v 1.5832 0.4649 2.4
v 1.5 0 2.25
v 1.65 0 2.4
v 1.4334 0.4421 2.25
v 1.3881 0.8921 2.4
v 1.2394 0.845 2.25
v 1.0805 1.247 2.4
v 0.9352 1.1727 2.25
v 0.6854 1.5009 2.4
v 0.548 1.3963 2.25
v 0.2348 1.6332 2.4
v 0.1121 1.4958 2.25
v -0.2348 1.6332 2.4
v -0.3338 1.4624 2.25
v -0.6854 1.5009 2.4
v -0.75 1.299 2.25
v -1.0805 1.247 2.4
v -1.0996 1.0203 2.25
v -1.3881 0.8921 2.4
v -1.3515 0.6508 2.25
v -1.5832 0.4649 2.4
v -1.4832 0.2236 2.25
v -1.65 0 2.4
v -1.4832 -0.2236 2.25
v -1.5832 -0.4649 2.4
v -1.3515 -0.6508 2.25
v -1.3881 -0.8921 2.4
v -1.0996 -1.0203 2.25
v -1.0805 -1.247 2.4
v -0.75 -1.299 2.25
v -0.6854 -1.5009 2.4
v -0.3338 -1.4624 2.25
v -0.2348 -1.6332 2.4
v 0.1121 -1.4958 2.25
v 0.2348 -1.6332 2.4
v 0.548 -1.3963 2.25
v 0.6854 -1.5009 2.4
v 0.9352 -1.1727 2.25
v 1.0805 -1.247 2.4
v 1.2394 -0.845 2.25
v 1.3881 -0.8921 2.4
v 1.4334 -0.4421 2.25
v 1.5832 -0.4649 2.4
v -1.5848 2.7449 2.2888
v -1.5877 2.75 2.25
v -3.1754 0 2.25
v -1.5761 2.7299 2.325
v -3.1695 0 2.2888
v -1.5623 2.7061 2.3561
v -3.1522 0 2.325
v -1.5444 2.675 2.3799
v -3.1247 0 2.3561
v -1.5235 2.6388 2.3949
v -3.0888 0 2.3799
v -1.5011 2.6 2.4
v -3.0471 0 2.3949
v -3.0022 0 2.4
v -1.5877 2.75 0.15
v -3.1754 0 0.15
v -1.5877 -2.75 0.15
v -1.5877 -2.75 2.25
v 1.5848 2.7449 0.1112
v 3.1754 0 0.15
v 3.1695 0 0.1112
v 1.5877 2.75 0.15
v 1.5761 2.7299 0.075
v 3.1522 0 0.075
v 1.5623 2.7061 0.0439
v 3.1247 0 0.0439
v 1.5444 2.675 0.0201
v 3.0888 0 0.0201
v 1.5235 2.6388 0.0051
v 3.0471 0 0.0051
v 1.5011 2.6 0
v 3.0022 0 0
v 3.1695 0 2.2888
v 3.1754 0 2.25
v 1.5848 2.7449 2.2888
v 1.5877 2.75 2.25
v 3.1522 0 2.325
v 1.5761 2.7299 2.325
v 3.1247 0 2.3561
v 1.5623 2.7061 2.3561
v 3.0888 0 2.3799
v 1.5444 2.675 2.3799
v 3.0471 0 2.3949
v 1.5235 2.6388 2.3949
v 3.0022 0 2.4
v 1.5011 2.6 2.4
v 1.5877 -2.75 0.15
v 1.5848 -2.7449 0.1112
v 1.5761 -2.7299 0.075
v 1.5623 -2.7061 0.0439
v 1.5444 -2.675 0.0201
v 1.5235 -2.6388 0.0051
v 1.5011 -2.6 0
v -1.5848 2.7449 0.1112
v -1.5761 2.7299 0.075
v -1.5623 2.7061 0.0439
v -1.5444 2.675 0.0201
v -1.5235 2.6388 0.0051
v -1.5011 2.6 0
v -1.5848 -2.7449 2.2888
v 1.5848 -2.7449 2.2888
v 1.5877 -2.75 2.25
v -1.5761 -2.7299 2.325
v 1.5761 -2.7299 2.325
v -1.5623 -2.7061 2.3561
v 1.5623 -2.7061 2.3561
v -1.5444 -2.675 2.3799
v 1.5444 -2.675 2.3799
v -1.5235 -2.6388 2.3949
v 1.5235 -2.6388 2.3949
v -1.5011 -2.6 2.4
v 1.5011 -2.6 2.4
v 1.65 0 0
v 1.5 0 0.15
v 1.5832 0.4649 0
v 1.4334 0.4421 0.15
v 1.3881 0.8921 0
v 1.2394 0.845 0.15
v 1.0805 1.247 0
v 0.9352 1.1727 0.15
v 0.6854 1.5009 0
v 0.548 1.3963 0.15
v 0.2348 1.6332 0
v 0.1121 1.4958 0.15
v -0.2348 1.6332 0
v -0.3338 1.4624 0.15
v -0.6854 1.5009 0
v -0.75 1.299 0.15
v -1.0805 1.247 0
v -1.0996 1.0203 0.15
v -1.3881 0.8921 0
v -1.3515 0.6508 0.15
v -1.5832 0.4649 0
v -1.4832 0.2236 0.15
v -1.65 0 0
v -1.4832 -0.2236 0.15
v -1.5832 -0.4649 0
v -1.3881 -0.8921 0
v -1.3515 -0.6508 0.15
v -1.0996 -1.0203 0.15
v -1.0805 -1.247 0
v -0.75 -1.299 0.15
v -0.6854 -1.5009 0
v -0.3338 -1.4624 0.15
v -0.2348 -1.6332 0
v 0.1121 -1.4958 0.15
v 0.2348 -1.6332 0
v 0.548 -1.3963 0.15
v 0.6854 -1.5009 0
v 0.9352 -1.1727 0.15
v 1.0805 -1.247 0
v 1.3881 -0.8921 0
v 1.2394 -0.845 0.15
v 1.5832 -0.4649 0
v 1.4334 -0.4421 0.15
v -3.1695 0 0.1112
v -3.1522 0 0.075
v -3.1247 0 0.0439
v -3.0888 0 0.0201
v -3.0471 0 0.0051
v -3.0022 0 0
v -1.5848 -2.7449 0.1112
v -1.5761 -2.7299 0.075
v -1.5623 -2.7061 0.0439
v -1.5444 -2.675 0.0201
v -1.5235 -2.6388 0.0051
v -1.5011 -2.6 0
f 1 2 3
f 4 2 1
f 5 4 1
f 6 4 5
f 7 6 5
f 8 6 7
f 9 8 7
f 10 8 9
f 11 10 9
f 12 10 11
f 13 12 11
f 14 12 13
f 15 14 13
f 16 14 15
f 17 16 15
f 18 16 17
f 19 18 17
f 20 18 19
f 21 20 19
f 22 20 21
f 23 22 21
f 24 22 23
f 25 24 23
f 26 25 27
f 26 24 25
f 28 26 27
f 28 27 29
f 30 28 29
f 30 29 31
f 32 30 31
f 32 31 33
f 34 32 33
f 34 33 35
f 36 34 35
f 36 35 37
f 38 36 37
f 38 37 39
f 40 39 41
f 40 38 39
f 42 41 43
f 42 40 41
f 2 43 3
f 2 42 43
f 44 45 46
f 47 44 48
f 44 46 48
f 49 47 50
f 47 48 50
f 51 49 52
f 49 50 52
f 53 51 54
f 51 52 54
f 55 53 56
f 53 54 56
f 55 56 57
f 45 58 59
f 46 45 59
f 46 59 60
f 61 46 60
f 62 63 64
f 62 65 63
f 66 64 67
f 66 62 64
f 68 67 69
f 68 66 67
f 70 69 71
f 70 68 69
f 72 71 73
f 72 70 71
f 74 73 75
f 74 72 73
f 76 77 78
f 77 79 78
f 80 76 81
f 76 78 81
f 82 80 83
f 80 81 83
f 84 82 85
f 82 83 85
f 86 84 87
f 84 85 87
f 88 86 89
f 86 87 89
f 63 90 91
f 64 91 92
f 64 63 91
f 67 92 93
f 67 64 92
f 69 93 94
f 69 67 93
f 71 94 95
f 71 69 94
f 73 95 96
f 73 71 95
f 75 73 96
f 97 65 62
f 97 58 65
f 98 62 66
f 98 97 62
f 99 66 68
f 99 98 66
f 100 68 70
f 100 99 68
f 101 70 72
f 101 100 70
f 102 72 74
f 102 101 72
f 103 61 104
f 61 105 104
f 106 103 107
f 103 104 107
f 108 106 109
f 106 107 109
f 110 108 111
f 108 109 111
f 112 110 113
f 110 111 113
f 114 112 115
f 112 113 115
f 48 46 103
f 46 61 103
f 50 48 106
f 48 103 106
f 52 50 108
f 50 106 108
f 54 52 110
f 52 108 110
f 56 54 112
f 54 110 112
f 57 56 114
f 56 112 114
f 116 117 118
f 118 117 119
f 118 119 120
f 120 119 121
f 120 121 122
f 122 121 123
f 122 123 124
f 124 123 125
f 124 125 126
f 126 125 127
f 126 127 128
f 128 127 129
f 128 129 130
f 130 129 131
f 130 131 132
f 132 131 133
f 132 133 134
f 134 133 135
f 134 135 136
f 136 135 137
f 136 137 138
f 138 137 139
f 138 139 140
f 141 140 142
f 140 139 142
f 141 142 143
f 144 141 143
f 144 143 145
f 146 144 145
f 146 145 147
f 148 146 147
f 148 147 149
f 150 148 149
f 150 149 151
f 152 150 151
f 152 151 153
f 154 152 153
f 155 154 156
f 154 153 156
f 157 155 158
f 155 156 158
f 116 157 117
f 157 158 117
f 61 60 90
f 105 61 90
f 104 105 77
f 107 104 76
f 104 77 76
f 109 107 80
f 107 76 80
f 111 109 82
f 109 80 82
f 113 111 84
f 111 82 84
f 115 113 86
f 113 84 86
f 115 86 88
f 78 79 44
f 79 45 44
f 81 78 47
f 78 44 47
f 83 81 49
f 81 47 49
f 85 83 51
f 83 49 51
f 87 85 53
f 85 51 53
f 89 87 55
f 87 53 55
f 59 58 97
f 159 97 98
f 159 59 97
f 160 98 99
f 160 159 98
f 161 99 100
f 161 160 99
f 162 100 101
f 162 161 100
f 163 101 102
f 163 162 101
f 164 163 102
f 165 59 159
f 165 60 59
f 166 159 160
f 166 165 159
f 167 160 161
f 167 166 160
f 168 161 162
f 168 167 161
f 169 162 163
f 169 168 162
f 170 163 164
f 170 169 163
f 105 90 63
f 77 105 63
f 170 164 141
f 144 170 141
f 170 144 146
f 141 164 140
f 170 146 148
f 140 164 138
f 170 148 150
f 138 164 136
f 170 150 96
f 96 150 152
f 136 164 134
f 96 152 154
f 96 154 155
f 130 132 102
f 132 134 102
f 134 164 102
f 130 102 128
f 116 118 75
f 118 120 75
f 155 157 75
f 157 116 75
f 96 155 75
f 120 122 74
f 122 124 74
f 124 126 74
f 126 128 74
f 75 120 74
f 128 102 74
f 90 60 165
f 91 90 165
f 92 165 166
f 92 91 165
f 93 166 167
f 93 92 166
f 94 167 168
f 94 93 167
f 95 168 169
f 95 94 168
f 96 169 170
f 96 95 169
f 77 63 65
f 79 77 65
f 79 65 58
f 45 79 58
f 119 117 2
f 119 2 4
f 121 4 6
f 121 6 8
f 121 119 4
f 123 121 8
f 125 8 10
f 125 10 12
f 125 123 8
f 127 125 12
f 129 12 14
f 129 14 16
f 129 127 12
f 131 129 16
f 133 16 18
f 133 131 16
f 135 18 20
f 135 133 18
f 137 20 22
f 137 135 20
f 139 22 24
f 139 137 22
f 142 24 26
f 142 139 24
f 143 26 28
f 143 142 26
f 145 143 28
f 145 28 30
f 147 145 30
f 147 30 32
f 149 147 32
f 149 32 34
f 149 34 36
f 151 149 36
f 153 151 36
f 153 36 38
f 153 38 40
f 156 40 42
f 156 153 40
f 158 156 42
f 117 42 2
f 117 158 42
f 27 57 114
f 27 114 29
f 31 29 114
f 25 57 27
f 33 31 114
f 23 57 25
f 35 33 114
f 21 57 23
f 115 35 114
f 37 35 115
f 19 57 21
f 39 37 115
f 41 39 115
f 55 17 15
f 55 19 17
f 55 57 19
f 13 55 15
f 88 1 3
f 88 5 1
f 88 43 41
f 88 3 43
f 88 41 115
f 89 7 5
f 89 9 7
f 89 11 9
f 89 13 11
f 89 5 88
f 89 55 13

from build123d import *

# Parameters (mm, degrees)
F2_R     = 1.5
F3_DEPTH = 2.4
F4_R     = 0.15
F5_SIZE  = 0.15


with BuildPart() as f3:
    # F2 (on Top) → F3 (new body)
    with BuildSketch(Plane.XY):
        Polygon((1.5877132403, 2.75), (-1.5877132403, 2.75), (-3.1754264805, 0), (-1.5877132403, -2.75), (1.5877132403, -2.75), (3.1754264805, 0), align=None)
        Circle(F2_R, mode=Mode.SUBTRACT)
    extrude(amount=F3_DEPTH)

    # F4
    f4_edges = [f3.edges().sort_by_distance(p)[0] for p in [
        (2.38157, -1.375, 2.4),
        (2.38157, 1.375, 2.4),
        (0, 2.75, 2.4),
        (-2.38157, 1.375, 2.4),
        (-2.38157, -1.375, 2.4),
        (0, -2.75, 2.4),
        (0, -2.75, 0),
        (2.38157, -1.375, 0),
        (-2.38157, -1.375, 0),
        (-2.38157, 1.375, 0),
        (0, 2.75, 0),
        (2.38157, 1.375, 0),
    ]]
    fillet(f4_edges, radius=F4_R)

    # F5
    f5_edges = [f3.edges().sort_by_distance(p)[0] for p in [
        (-1.5, 0, 2.4),
        (-1.5, 0, 0),
    ]]
    chamfer(f5_edges, length=F5_SIZE)


solid = f3.part
